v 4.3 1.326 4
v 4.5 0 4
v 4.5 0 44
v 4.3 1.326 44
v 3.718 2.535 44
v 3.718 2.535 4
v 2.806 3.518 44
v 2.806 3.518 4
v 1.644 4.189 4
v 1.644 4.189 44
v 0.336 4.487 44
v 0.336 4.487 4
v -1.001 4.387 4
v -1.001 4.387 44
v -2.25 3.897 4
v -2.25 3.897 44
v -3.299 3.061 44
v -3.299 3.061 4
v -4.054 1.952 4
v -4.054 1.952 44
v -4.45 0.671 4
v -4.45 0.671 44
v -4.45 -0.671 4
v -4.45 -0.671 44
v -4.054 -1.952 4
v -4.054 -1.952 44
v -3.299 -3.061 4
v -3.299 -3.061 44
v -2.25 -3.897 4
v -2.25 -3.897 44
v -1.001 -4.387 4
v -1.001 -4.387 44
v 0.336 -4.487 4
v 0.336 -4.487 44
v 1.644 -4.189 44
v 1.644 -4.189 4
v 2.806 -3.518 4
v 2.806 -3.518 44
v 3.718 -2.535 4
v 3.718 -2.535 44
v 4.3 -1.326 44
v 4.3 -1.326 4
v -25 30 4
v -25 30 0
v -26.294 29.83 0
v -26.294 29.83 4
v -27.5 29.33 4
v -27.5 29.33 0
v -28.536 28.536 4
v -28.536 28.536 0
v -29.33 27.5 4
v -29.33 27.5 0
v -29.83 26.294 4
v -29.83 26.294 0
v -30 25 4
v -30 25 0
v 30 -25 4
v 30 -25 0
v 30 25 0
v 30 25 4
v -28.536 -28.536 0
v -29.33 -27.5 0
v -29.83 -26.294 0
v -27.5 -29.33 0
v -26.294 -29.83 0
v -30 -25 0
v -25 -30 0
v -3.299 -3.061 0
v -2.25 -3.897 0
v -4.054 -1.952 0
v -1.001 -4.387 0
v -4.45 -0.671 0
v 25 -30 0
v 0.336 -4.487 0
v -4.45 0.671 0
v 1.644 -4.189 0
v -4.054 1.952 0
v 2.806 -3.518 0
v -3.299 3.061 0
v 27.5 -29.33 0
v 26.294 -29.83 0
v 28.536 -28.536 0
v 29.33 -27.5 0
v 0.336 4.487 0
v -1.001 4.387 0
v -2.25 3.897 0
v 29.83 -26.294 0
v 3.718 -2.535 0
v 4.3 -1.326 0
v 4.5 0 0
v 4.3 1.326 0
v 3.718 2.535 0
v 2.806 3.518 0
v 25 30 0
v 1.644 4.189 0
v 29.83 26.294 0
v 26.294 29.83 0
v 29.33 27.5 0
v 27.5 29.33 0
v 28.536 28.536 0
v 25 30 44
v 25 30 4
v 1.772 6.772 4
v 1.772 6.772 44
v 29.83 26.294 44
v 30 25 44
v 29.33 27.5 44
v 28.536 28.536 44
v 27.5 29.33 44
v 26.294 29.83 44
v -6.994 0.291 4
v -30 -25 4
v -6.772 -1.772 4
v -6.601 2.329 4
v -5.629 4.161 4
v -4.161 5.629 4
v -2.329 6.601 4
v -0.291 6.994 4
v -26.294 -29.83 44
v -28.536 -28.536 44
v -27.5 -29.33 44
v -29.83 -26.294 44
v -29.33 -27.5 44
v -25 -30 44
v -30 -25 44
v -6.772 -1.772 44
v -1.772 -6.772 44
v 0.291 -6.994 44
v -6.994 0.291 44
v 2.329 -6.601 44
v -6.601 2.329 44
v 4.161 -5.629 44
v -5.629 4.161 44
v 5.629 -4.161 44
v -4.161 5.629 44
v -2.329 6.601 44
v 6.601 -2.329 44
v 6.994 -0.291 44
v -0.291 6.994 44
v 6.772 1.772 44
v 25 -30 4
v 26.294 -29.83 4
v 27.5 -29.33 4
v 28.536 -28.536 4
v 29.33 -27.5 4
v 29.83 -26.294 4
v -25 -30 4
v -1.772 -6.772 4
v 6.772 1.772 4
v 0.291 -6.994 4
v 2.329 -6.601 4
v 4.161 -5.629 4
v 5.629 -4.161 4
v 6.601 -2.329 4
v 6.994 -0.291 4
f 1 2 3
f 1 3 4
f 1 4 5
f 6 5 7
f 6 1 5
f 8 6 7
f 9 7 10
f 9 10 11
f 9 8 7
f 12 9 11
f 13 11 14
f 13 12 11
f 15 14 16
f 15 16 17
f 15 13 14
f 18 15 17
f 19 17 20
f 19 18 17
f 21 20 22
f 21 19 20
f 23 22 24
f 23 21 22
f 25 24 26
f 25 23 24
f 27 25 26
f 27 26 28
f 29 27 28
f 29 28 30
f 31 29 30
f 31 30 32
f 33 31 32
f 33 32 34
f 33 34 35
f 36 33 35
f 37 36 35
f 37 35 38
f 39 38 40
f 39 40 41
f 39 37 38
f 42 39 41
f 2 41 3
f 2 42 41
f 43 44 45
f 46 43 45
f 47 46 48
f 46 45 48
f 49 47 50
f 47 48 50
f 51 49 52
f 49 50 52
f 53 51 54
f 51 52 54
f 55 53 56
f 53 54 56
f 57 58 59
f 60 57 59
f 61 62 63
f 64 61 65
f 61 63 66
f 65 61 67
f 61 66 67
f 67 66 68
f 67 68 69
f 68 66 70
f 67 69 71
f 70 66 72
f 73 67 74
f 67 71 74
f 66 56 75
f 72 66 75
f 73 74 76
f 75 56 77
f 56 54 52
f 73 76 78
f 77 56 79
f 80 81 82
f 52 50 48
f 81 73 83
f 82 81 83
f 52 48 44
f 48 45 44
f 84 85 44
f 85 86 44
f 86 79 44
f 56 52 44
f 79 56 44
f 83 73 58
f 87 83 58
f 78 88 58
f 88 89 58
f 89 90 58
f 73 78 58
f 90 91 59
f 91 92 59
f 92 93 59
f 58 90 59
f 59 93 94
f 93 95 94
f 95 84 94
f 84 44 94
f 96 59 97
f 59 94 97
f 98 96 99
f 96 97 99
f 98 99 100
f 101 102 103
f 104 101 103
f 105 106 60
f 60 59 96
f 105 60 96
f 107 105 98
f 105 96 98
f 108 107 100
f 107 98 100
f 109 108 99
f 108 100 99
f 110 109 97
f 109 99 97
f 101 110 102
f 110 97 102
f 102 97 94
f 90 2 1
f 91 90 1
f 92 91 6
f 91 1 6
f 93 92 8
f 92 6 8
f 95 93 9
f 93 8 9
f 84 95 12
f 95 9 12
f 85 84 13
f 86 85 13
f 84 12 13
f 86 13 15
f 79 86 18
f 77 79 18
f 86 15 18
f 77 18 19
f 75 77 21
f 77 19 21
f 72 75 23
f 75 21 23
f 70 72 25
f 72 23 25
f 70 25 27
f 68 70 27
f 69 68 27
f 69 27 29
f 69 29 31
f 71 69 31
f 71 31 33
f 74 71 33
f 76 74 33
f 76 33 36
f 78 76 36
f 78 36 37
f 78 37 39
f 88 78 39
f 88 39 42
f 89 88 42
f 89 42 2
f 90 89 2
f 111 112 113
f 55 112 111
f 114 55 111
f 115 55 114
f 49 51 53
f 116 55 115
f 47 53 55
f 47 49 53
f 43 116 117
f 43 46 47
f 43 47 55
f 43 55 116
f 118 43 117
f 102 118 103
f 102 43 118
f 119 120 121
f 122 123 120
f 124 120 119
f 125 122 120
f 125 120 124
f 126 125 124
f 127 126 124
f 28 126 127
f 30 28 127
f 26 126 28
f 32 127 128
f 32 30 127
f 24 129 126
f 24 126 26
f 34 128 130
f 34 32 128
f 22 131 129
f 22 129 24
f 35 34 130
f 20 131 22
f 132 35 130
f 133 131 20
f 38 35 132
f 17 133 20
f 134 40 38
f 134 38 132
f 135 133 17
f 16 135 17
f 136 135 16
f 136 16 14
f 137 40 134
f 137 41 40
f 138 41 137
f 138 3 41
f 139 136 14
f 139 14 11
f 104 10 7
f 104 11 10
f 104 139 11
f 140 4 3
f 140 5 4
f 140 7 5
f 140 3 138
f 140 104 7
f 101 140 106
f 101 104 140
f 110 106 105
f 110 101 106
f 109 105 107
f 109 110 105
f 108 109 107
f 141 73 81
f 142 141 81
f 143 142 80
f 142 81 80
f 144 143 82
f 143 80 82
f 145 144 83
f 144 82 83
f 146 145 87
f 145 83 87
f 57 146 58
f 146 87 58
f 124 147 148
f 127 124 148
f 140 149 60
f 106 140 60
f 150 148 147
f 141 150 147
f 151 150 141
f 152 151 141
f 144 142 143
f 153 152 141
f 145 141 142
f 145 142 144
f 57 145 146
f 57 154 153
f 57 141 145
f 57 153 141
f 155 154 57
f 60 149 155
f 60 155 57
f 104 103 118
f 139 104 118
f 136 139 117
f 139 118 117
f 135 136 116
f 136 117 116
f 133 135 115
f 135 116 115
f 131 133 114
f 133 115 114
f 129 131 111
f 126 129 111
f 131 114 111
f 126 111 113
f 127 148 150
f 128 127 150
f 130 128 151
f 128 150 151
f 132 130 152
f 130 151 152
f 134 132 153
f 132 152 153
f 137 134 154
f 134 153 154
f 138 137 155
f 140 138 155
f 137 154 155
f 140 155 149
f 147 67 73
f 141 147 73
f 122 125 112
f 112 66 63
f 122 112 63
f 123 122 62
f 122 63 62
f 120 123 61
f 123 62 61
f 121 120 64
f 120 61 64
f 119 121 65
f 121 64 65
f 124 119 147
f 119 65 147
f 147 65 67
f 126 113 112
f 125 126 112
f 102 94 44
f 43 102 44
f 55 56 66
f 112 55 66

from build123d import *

# Parameters (mm, degrees)
F1_DEPTH = 4
F2_R     = 4.5
F3_DEPTH = 40
F4_DEPTH = 25


with BuildPart() as f1:
    # F0 (on Top) → F1 (new body)
    with BuildSketch(Plane.XY):
        with BuildLine():
            Line((-25, -30), (25, -30))
            ThreePointArc((25, -30), (28.535534, -28.535534), (30, -25))
            Line((30, -25), (30, 25))
            ThreePointArc((30, 25), (28.535534, 28.535534), (25, 30))
            Line((25, 30), (-25, 30))
            ThreePointArc((-25, 30), (-28.535534, 28.535534), (-30, 25))
            Line((-30, 25), (-30, -25))
            ThreePointArc((-30, -25), (-28.535534, -28.535534), (-25, -30))
        make_face()
    extrude(amount=F1_DEPTH)

    # F2 (on face) → F3 (join)
    with BuildSketch(Plane.XY.offset(4)):
        with BuildLine():
            Line((25, 30), (1.772002, 6.772002))
            ThreePointArc((1.772002, 6.772002), (-4.949747, 4.949747), (-6.772002, -1.772002))
            Line((-6.772002, -1.772002), (-30, -25))
            ThreePointArc((-30, -25), (-28.535534, -28.535534), (-25, -30))
            Line((-25, -30), (-1.772002, -6.772002))
            ThreePointArc((-1.772002, -6.772002), (4.949747, -4.949747), (6.772002, 1.772002))
            Line((6.772002, 1.772002), (30, 25))
            ThreePointArc((30, 25), (28.535534, 28.535534), (25, 30))
        make_face()
        Circle(F2_R, mode=Mode.SUBTRACT)
    extrude(amount=F3_DEPTH)

    # F2 (on face) → F4 (cut)
    with BuildSketch(Plane.XY.offset(4)):
        Circle(F2_R)
    extrude(amount=-F4_DEPTH, mode=Mode.SUBTRACT)


solid = f1.part
